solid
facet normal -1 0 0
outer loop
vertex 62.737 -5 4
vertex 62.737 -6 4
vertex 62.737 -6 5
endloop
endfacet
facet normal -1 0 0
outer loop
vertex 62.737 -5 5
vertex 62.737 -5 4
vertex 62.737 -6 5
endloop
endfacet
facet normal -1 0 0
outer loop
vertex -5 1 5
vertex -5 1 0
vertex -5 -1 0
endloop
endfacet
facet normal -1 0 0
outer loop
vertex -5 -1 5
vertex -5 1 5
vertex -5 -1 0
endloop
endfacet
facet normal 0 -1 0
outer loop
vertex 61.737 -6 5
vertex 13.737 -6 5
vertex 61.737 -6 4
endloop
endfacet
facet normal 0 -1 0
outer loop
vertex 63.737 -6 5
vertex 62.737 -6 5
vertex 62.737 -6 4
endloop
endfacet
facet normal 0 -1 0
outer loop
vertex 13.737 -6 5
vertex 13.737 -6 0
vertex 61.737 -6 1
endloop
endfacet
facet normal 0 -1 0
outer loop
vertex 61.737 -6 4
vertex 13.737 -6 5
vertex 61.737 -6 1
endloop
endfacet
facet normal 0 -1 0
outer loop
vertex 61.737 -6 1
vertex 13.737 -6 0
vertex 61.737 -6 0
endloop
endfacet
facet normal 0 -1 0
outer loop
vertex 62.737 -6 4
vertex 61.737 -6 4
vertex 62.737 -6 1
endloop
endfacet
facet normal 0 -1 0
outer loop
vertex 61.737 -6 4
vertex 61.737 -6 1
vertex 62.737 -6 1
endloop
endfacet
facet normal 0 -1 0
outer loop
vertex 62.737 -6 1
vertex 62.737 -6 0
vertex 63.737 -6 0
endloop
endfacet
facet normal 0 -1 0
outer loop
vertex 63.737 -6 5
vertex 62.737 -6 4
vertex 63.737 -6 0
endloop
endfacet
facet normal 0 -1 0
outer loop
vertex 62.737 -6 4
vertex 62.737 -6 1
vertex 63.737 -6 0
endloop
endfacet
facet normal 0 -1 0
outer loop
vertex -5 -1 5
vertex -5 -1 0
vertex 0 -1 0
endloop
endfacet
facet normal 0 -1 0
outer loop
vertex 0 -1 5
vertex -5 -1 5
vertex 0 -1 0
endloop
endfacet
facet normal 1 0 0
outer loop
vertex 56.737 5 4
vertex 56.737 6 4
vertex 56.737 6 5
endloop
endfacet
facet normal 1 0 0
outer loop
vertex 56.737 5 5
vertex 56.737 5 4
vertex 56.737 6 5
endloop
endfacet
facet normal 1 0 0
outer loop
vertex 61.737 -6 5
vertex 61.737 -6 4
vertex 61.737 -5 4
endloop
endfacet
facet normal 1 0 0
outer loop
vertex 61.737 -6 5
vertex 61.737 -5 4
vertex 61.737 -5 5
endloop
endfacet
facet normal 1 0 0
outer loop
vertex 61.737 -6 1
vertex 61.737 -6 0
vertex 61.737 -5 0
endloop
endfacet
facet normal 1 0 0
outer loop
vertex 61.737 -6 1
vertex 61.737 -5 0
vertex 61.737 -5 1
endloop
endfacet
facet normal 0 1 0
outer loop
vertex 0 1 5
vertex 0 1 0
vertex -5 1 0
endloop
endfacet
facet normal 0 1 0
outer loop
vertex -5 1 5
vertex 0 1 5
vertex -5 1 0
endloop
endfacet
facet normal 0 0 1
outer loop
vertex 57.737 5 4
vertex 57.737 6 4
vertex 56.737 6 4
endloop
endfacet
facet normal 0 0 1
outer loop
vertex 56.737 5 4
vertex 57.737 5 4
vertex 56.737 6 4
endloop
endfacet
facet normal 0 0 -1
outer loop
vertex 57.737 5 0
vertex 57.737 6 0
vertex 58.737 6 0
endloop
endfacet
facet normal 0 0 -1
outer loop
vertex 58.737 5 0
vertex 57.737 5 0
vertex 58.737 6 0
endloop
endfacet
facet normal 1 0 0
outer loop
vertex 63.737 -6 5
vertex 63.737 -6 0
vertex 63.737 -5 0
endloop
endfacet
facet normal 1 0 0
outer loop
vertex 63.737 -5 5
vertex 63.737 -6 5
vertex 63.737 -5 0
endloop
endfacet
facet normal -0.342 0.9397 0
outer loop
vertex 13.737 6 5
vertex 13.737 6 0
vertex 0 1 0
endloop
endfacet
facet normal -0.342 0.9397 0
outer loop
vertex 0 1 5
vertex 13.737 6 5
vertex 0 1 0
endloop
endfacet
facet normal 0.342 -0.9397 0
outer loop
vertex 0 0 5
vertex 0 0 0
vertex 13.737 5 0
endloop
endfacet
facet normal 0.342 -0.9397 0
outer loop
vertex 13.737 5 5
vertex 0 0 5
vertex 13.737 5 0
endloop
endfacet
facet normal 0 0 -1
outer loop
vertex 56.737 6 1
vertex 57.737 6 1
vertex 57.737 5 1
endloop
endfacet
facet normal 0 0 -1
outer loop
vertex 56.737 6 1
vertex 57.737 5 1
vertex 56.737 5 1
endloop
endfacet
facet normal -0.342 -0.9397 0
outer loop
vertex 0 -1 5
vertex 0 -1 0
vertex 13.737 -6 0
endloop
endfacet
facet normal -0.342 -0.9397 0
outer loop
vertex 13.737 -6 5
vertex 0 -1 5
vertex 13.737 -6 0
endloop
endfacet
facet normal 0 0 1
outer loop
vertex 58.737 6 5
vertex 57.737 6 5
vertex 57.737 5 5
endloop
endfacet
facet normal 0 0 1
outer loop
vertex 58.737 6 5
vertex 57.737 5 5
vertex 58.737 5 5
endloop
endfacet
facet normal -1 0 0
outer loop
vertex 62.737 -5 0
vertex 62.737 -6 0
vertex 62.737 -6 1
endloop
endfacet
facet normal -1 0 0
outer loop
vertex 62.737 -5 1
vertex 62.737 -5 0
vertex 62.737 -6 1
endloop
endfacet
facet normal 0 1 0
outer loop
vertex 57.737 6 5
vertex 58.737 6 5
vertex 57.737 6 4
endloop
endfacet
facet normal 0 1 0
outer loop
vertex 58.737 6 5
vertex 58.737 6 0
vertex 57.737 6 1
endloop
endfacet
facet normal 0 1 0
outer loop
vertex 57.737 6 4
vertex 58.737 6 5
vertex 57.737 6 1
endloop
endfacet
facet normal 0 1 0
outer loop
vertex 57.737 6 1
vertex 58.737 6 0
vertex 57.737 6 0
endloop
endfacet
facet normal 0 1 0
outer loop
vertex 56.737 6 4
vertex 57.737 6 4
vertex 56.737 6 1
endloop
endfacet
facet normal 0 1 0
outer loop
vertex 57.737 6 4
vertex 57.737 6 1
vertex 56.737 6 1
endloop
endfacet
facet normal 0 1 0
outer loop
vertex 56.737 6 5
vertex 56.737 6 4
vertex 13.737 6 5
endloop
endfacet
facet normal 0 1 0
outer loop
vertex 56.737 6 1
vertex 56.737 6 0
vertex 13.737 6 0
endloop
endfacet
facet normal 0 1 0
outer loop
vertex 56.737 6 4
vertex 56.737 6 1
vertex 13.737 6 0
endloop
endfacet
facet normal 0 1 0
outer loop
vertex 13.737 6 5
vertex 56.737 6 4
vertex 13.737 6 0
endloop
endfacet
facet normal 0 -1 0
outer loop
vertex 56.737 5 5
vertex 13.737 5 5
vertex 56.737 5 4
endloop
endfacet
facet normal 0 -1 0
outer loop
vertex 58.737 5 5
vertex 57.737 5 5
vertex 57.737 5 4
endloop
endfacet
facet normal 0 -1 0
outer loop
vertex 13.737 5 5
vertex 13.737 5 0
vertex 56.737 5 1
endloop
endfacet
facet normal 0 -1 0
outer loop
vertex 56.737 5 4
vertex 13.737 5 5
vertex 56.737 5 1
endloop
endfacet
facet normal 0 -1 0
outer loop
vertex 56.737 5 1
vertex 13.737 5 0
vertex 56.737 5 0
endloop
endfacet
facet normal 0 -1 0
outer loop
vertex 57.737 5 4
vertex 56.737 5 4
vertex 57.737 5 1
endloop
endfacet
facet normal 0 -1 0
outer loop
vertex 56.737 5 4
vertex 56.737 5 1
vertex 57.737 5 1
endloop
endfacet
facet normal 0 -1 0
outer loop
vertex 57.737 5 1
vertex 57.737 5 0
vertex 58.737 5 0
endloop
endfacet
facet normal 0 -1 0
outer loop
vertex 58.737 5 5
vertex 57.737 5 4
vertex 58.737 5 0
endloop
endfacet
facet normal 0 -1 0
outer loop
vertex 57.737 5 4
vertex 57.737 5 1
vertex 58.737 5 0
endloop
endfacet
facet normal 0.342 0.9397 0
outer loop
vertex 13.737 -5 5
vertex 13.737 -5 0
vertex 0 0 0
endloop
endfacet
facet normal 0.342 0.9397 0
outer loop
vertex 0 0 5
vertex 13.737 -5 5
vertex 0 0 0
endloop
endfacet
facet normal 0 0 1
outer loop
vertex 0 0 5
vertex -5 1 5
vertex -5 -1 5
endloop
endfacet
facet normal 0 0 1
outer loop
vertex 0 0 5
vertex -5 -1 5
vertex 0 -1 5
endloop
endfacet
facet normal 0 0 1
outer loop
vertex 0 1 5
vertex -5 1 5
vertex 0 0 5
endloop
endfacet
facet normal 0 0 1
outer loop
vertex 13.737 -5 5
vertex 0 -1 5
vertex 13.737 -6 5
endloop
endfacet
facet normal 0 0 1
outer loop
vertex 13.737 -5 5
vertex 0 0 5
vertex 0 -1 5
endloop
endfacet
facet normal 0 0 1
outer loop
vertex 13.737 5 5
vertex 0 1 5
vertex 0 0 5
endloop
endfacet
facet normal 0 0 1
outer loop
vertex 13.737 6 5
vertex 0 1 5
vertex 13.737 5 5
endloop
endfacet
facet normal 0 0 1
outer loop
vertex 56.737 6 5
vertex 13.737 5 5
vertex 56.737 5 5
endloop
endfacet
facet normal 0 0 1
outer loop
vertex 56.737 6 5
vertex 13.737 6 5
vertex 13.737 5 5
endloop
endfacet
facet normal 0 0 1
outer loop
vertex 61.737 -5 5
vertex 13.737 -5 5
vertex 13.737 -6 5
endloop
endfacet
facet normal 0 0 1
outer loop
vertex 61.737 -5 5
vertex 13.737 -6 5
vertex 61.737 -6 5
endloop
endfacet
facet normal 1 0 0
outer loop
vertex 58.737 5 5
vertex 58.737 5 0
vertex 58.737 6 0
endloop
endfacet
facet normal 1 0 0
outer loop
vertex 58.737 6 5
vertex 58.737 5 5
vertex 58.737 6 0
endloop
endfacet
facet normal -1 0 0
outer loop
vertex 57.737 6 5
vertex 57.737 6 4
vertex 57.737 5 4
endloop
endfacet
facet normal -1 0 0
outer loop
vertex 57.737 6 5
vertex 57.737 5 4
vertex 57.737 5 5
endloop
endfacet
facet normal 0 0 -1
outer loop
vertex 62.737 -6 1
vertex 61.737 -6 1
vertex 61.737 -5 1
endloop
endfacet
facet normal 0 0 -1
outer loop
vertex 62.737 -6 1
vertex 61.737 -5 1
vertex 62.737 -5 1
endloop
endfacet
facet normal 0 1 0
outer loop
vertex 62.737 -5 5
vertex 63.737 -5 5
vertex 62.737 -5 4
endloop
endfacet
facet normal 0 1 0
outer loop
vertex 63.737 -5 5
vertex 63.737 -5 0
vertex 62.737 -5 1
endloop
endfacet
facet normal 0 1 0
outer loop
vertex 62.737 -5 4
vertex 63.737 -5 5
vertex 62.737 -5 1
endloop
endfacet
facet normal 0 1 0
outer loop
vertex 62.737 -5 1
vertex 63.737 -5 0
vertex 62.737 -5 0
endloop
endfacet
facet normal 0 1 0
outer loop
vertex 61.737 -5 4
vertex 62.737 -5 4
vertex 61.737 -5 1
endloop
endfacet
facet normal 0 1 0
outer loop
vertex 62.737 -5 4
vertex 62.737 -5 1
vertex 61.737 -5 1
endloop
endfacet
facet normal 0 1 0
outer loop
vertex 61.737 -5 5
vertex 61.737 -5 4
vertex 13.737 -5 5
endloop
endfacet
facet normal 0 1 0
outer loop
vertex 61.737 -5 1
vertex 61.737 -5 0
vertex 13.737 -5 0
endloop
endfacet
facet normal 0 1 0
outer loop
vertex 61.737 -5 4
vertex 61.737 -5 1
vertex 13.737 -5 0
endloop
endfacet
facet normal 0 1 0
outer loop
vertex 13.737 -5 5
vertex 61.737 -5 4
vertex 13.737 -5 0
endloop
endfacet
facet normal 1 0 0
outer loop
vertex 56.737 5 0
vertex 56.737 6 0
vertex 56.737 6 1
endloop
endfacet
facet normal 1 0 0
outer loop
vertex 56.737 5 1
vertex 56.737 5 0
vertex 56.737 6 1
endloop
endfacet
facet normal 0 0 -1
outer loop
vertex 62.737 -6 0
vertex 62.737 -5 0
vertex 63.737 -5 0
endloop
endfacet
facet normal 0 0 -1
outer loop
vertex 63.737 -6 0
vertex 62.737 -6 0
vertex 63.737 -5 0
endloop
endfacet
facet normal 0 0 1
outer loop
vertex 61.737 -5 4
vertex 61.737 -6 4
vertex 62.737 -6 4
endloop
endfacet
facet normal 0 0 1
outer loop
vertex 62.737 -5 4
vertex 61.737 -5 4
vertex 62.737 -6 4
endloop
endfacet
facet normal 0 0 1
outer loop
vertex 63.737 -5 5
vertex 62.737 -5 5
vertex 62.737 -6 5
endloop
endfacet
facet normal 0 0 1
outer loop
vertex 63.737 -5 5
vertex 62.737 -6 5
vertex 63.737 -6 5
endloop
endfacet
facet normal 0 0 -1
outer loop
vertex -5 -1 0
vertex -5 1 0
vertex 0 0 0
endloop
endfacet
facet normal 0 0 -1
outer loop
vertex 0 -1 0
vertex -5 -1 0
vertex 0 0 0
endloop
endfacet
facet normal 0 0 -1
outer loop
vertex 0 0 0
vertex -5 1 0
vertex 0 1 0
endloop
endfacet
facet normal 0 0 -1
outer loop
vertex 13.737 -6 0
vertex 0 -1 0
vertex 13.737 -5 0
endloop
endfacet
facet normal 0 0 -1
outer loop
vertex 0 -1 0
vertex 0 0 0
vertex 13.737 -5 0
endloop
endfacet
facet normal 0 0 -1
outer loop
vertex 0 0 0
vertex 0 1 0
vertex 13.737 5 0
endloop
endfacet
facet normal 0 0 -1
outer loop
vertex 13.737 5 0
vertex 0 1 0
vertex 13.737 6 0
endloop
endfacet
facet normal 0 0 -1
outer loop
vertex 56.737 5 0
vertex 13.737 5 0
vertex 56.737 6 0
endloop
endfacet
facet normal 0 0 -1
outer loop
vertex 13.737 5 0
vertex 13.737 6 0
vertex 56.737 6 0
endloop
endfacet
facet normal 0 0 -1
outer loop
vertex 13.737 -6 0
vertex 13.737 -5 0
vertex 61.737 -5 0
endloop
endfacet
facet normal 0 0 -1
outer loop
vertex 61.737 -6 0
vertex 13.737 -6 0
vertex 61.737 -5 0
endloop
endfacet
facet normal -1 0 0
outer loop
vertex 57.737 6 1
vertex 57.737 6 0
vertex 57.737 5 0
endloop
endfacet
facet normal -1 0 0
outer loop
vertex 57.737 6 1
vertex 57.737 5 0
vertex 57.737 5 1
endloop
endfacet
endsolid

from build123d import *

# Parameters (mm, degrees)
F1_DEPTH = 5
F2_W     = 1
F2_H     = 1
F3_DEPTH = 1
F4_W     = 1
F4_H     = 1
F5_DEPTH = 1


with BuildPart() as f1:
    # F0 (on Top) → F1 (new body)
    with BuildSketch(Plane.XY):
        Polygon((13.737387, -5), (0, 0), (13.737387, 5), (58.737387, 5), (58.737387, 6), (13.737387, 6), (0, 1), (-5, 1), (-5, -1), (0, -1), (13.737387, -6), (63.737387, -6), (63.737387, -5), align=None)
    extrude(amount=F1_DEPTH)

    # F2 (on face) → F3 (cut, through all)
    with BuildSketch(Plane(origin=(0, 6, 0), x_dir=(-1, 0, 0), z_dir=(0, 1, 0))):
        with Locations((-57.237387, 4.5)):
            Rectangle(F2_W, F2_H)
        with Locations((-57.237387, 0.5)):
            Rectangle(F2_W, F2_H)
    extrude(amount=-F3_DEPTH, mode=Mode.SUBTRACT)

    # F4 (on face) → F5 (cut, through all)
    with BuildSketch(Plane.XZ.offset(6)):
        with Locations((62.237387, 4.5)):
            Rectangle(F4_W, F4_H)
        with Locations((62.237387, 0.5)):
            Rectangle(F4_W, F4_H)
    extrude(amount=-F5_DEPTH, mode=Mode.SUBTRACT)


solid = f1.part
